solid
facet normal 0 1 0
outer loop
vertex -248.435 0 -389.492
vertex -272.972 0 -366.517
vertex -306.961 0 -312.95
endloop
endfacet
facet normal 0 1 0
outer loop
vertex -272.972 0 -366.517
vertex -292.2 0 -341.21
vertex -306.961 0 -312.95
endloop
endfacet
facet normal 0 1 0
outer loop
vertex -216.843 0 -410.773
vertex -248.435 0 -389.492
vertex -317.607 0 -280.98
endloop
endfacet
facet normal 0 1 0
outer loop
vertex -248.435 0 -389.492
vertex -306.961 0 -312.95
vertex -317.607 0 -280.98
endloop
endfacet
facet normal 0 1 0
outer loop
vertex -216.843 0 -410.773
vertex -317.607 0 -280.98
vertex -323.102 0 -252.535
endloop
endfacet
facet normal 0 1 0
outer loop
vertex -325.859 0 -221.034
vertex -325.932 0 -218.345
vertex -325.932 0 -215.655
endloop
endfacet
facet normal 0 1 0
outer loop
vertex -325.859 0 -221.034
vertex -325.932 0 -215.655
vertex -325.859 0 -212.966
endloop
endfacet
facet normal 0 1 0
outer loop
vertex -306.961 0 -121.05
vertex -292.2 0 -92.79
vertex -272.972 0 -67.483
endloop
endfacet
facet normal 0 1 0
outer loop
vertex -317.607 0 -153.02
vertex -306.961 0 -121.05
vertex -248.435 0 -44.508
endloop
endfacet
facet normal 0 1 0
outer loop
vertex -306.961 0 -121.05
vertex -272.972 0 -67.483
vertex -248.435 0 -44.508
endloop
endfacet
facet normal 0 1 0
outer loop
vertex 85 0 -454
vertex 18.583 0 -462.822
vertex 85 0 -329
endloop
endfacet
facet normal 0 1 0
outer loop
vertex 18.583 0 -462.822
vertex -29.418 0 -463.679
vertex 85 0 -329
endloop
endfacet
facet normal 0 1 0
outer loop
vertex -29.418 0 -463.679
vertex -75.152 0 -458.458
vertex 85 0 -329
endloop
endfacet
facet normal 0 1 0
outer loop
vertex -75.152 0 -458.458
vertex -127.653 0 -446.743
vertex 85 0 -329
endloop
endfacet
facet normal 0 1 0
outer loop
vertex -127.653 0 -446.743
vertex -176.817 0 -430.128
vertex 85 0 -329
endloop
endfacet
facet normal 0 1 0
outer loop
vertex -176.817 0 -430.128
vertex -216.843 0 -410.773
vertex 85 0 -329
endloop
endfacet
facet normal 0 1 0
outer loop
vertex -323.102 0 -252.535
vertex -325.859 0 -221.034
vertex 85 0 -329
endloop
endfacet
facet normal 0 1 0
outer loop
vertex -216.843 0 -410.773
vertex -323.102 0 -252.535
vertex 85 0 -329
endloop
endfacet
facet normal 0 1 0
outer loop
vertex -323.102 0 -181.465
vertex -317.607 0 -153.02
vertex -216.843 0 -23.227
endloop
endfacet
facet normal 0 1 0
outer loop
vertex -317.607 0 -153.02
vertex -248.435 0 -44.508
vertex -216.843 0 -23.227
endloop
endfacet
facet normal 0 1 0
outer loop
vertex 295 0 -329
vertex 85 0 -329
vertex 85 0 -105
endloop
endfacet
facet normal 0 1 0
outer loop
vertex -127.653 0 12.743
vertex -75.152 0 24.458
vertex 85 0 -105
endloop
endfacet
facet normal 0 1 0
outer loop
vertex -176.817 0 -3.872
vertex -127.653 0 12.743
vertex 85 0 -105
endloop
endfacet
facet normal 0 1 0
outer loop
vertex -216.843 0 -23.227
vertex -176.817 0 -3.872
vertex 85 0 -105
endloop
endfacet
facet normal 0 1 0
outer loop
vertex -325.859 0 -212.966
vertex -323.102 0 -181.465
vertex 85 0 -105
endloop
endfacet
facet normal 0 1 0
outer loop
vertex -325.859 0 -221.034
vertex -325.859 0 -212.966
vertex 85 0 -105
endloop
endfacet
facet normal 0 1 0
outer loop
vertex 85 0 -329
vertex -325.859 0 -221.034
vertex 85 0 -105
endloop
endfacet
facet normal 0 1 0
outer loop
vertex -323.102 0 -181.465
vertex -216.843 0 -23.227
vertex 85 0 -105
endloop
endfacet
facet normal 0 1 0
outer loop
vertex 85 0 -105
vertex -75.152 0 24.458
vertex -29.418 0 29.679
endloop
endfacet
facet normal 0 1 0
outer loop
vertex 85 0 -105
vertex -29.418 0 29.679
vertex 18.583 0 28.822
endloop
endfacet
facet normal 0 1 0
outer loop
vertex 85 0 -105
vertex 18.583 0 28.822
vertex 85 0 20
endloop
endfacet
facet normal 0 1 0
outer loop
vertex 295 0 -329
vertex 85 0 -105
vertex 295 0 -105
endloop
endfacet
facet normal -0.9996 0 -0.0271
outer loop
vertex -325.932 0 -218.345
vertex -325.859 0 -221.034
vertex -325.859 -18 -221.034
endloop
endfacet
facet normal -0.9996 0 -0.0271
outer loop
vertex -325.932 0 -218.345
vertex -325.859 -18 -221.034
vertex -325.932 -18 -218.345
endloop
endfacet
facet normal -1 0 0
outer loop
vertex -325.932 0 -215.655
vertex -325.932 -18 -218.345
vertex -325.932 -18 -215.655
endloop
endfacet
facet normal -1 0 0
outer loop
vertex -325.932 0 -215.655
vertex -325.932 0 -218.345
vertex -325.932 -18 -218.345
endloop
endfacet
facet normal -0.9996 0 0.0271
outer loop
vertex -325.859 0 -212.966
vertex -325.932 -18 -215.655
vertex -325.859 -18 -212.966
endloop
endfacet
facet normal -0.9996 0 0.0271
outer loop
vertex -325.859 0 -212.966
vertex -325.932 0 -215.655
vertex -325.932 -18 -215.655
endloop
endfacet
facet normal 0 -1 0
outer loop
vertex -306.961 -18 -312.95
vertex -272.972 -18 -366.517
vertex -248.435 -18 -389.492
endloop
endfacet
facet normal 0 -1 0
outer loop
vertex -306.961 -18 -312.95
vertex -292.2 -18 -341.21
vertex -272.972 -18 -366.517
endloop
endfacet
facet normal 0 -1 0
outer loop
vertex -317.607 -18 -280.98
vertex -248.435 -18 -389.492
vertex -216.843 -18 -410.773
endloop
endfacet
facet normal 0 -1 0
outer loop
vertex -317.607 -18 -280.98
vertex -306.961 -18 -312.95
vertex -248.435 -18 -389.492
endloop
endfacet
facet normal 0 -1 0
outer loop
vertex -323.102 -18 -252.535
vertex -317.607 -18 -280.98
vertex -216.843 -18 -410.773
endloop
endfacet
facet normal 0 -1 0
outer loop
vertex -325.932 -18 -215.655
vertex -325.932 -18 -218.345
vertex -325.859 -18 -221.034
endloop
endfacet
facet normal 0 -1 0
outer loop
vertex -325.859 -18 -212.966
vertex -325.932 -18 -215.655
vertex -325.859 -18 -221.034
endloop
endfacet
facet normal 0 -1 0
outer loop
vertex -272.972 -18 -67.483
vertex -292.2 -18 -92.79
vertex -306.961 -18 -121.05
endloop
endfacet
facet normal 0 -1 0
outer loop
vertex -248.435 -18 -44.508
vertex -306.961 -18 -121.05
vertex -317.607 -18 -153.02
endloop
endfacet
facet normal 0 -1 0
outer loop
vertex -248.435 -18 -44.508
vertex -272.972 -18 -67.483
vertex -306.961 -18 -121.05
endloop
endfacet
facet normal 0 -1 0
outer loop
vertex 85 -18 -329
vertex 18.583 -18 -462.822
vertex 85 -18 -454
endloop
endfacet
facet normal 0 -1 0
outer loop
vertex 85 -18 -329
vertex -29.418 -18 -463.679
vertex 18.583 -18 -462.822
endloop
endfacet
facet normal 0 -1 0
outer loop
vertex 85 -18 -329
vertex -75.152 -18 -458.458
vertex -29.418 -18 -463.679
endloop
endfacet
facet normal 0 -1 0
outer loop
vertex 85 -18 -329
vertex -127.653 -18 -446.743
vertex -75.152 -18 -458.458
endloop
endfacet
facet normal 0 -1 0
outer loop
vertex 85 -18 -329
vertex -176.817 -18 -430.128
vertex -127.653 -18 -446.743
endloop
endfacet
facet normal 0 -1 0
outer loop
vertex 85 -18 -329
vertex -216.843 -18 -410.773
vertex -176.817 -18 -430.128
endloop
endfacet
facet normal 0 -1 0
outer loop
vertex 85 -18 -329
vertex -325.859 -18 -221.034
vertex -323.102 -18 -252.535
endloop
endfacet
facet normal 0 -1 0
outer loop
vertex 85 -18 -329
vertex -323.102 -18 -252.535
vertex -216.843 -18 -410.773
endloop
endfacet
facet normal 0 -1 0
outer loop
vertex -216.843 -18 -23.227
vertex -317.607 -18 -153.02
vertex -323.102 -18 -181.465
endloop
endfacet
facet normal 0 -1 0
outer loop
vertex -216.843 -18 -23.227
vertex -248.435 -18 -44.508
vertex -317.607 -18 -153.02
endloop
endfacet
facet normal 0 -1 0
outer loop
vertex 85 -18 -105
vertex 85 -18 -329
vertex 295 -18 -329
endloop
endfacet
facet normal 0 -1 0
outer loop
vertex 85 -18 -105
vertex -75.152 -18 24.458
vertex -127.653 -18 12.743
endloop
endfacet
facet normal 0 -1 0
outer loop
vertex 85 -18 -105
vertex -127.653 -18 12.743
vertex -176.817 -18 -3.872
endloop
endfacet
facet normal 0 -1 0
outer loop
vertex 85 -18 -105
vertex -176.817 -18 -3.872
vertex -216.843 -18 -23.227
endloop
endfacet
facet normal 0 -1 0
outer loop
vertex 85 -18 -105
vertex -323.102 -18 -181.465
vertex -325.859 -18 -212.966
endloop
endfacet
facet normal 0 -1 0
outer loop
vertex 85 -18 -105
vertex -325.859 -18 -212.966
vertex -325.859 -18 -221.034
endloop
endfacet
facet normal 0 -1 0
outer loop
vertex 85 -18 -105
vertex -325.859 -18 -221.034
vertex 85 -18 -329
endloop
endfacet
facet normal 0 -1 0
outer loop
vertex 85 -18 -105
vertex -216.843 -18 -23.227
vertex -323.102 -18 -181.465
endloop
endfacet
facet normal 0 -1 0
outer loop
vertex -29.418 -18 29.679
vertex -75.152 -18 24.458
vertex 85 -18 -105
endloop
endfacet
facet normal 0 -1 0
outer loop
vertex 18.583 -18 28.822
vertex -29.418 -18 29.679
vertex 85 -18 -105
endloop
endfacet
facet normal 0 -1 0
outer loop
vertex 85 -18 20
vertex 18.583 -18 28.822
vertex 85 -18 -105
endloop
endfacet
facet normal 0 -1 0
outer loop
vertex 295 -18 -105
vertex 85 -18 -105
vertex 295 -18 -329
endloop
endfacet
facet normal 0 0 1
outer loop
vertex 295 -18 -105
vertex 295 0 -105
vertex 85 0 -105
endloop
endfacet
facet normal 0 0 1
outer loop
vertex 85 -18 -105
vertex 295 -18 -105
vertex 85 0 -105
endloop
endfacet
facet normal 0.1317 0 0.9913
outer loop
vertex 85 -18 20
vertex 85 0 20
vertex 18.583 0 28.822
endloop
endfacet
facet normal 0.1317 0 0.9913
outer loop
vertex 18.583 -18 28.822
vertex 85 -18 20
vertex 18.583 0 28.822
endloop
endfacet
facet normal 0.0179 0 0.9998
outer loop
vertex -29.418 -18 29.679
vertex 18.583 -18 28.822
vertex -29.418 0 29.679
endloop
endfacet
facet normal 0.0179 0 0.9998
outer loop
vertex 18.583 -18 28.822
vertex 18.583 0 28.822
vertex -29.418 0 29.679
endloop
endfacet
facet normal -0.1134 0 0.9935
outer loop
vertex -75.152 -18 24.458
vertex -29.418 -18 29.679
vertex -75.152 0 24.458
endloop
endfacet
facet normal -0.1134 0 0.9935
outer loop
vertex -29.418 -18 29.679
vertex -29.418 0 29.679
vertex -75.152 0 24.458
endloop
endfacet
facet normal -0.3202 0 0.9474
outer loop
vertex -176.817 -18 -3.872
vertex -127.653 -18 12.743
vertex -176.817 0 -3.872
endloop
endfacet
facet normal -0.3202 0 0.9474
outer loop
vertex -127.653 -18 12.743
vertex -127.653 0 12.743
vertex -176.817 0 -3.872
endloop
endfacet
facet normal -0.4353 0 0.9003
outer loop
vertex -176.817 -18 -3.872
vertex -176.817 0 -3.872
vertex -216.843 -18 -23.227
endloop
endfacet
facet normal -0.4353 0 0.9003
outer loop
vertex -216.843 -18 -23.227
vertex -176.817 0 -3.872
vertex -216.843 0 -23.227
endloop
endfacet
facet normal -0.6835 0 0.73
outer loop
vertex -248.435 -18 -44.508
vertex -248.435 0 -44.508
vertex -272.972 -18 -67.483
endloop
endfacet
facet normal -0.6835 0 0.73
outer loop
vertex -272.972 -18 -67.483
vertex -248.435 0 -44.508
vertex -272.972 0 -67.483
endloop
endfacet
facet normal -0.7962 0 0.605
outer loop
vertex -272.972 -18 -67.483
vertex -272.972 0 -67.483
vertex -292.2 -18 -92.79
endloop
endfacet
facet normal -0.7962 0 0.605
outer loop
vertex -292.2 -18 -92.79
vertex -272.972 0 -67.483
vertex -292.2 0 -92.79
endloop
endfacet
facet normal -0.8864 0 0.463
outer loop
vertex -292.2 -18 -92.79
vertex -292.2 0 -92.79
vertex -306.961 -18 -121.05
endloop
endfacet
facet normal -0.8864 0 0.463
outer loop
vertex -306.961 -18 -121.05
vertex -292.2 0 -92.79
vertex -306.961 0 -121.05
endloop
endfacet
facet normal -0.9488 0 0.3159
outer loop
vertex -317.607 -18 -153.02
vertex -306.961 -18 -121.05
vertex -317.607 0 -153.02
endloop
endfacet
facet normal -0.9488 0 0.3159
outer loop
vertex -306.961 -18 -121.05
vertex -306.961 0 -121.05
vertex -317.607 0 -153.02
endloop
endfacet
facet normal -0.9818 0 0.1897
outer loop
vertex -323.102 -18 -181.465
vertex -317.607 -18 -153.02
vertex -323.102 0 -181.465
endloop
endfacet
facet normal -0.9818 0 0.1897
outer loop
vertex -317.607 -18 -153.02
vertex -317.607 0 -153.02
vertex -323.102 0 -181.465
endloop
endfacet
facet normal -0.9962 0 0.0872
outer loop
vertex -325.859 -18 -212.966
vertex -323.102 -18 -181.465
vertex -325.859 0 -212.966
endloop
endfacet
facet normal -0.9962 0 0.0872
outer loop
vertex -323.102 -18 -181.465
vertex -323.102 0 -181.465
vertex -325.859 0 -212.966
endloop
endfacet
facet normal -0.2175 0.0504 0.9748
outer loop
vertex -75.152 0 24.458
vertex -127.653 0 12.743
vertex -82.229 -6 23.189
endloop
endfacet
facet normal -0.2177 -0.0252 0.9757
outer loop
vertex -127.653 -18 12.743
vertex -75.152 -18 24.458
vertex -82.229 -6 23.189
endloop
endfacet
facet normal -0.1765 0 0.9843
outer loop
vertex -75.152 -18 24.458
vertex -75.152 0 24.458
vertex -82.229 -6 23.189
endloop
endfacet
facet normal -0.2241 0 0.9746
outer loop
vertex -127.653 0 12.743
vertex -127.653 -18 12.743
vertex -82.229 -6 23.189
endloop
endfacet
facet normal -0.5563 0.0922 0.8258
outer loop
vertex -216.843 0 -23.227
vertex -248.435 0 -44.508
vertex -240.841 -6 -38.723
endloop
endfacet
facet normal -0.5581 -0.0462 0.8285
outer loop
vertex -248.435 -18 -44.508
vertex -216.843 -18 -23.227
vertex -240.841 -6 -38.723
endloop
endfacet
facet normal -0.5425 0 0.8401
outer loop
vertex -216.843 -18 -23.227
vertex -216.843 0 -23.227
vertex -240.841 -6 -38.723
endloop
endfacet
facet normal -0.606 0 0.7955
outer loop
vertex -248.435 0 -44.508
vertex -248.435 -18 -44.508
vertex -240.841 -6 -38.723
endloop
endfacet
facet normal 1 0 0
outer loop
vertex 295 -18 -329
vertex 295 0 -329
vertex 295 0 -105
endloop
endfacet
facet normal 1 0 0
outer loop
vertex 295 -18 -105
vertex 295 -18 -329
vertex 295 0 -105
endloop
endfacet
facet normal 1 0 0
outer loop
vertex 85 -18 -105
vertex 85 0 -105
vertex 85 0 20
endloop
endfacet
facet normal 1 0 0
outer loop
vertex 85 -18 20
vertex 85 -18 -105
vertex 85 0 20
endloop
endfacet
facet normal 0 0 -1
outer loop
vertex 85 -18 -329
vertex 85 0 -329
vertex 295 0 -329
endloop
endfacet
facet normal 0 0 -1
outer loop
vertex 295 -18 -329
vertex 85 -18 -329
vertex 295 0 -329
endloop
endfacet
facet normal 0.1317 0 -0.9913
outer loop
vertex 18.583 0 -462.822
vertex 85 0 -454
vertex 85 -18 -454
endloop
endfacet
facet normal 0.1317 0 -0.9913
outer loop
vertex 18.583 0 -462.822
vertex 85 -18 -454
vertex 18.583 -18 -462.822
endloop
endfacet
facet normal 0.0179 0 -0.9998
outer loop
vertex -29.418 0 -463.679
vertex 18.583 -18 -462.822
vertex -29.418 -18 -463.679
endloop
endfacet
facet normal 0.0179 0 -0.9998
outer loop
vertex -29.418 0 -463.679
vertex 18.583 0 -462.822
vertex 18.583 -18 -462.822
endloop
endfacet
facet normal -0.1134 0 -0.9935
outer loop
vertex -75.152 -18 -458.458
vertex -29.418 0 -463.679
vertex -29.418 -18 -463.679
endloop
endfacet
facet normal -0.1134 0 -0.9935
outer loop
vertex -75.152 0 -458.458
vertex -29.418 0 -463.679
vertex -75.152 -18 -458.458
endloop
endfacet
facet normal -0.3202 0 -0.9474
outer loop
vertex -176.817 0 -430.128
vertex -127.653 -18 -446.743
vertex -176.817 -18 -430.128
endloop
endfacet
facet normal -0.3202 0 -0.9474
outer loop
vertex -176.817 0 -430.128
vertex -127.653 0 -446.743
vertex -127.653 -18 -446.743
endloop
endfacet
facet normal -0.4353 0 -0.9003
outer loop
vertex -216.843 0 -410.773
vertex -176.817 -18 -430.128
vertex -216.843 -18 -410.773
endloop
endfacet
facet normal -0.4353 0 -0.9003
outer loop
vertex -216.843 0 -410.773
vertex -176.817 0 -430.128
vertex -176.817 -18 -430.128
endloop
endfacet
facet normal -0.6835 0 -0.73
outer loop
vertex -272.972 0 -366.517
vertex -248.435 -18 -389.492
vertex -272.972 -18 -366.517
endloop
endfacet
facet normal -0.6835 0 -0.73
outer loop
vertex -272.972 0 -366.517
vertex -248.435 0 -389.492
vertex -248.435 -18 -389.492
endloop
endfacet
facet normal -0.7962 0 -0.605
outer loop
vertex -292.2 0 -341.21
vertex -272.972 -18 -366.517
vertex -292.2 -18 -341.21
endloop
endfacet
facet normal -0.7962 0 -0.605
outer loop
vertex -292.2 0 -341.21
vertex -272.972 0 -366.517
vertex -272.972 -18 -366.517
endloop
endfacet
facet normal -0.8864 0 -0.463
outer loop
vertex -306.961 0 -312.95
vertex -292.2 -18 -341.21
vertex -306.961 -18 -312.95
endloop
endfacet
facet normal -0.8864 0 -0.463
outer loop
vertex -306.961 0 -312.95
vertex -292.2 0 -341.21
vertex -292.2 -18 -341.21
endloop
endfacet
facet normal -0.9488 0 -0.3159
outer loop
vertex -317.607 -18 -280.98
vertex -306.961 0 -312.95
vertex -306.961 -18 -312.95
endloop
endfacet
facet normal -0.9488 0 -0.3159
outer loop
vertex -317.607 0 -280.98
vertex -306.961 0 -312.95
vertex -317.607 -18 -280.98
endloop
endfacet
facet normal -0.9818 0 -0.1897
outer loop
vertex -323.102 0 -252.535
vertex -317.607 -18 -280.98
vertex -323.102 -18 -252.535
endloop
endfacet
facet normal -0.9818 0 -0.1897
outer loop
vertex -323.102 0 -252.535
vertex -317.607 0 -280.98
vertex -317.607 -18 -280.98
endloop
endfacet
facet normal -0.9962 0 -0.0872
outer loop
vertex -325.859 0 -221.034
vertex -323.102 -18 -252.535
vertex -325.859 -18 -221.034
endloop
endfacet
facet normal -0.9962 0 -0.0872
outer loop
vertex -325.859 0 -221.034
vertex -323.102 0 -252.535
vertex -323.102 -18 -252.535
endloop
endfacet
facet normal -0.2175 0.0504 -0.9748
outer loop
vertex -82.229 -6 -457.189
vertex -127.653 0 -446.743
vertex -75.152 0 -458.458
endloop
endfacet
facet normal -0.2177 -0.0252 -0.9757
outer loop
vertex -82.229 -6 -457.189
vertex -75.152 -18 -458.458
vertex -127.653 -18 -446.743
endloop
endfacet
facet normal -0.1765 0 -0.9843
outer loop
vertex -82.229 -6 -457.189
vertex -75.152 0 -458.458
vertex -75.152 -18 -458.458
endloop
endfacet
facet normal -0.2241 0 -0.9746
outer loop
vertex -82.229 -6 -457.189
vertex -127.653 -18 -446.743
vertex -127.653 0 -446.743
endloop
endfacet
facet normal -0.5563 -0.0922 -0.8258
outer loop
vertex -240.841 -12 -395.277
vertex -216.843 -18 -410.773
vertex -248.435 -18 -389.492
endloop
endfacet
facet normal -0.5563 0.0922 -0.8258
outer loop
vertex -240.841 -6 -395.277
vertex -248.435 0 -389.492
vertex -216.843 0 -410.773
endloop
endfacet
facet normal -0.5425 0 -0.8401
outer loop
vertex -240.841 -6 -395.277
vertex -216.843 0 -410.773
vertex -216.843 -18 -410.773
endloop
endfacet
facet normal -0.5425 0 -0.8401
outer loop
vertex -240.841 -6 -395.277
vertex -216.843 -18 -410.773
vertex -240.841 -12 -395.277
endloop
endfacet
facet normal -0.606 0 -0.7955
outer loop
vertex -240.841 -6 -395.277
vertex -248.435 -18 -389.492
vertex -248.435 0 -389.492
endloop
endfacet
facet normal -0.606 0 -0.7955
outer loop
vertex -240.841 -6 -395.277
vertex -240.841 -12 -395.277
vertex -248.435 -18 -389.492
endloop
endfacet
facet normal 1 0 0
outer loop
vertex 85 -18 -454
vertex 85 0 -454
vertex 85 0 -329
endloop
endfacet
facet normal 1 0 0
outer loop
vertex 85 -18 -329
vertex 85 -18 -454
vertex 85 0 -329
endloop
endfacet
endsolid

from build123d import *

# Parameters (mm, degrees)
F1_DEPTH    = 18
F2_T1_DEPTH = 18


# Not quite as in the source:
# - a fillet or chamfer that OpenCascade refuses, or shapes differently, is made with other operations: its cross-section is extruded or revolved along the edge and cut away or added


with BuildPart() as f1:
    # F0 (on Front) → F1 (new body)
    with BuildSketch(Plane.XZ):
        with BuildLine():
            Line((295, -217), (-326, -217))
            add(Edge.make_bspline(
                [(85, -454), (9.4357049053, -467.1385897042), (-72.818934134, -466.1104352643), (-260.3771381726, -409.0142413584), (-323.4175443649, -304.8886355162), (-326, -217)],
                knots=[0, 0, 0, 0, 0.3230188863, 0.6489287258, 1, 1, 1, 1], degree=3))
            Line((85, -454), (85, -329))
            Line((85, -329), (295, -329))
            Line((295, -329), (295, -217))
        make_face()
        with BuildLine():
            add(Edge.make_bspline(
                [(85, 20), (9.4357049053, 33.1385897042), (-72.818934134, 32.1104352643), (-260.3771381726, -24.9857586416), (-323.4175443649, -129.1113644838), (-326, -217)],
                knots=[0, 0, 0, 0, 0.3230188863, 0.6489287258, 1, 1, 1, 1], degree=3))
            Line((-326, -217), (295, -217))
            Line((295, -217), (295, -105))
            Line((295, -105), (85, -105))
            Line((85, -105), (85, 20))
        make_face()
    extrude(amount=F1_DEPTH)

    # F2: fillet of radius 100 on 1 edges, made by hand

    # F2_s2 → F2_t1 (cut)
    with BuildSketch(Plane.XZ):
        with BuildLine():
            ThreePointArc((-325.8594220148, -221.0337656795), (-325.9408114638, -217), (-325.8594220148, -212.9662343205))
            Line((-325.8594220148, -212.9662343205), (-327.8577942258, -212.8855590069))
            ThreePointArc((-327.8577942258, -212.8855590069), (-327.9340315871, -214.9132915531), (-327.999137182, -216.9412588095))
            Line((-327.999137182, -216.9412588095), (-327.999137182, -217.0587411905))
            ThreePointArc((-327.999137182, -217.0587411905), (-327.9340315871, -219.0867084469), (-327.8577942258, -221.1144409931))
            Line((-327.8577942258, -221.1144409931), (-325.8594220148, -221.0337656795))
        make_face()
    extrude(amount=F2_T1_DEPTH, mode=Mode.SUBTRACT)


solid = f1.part
